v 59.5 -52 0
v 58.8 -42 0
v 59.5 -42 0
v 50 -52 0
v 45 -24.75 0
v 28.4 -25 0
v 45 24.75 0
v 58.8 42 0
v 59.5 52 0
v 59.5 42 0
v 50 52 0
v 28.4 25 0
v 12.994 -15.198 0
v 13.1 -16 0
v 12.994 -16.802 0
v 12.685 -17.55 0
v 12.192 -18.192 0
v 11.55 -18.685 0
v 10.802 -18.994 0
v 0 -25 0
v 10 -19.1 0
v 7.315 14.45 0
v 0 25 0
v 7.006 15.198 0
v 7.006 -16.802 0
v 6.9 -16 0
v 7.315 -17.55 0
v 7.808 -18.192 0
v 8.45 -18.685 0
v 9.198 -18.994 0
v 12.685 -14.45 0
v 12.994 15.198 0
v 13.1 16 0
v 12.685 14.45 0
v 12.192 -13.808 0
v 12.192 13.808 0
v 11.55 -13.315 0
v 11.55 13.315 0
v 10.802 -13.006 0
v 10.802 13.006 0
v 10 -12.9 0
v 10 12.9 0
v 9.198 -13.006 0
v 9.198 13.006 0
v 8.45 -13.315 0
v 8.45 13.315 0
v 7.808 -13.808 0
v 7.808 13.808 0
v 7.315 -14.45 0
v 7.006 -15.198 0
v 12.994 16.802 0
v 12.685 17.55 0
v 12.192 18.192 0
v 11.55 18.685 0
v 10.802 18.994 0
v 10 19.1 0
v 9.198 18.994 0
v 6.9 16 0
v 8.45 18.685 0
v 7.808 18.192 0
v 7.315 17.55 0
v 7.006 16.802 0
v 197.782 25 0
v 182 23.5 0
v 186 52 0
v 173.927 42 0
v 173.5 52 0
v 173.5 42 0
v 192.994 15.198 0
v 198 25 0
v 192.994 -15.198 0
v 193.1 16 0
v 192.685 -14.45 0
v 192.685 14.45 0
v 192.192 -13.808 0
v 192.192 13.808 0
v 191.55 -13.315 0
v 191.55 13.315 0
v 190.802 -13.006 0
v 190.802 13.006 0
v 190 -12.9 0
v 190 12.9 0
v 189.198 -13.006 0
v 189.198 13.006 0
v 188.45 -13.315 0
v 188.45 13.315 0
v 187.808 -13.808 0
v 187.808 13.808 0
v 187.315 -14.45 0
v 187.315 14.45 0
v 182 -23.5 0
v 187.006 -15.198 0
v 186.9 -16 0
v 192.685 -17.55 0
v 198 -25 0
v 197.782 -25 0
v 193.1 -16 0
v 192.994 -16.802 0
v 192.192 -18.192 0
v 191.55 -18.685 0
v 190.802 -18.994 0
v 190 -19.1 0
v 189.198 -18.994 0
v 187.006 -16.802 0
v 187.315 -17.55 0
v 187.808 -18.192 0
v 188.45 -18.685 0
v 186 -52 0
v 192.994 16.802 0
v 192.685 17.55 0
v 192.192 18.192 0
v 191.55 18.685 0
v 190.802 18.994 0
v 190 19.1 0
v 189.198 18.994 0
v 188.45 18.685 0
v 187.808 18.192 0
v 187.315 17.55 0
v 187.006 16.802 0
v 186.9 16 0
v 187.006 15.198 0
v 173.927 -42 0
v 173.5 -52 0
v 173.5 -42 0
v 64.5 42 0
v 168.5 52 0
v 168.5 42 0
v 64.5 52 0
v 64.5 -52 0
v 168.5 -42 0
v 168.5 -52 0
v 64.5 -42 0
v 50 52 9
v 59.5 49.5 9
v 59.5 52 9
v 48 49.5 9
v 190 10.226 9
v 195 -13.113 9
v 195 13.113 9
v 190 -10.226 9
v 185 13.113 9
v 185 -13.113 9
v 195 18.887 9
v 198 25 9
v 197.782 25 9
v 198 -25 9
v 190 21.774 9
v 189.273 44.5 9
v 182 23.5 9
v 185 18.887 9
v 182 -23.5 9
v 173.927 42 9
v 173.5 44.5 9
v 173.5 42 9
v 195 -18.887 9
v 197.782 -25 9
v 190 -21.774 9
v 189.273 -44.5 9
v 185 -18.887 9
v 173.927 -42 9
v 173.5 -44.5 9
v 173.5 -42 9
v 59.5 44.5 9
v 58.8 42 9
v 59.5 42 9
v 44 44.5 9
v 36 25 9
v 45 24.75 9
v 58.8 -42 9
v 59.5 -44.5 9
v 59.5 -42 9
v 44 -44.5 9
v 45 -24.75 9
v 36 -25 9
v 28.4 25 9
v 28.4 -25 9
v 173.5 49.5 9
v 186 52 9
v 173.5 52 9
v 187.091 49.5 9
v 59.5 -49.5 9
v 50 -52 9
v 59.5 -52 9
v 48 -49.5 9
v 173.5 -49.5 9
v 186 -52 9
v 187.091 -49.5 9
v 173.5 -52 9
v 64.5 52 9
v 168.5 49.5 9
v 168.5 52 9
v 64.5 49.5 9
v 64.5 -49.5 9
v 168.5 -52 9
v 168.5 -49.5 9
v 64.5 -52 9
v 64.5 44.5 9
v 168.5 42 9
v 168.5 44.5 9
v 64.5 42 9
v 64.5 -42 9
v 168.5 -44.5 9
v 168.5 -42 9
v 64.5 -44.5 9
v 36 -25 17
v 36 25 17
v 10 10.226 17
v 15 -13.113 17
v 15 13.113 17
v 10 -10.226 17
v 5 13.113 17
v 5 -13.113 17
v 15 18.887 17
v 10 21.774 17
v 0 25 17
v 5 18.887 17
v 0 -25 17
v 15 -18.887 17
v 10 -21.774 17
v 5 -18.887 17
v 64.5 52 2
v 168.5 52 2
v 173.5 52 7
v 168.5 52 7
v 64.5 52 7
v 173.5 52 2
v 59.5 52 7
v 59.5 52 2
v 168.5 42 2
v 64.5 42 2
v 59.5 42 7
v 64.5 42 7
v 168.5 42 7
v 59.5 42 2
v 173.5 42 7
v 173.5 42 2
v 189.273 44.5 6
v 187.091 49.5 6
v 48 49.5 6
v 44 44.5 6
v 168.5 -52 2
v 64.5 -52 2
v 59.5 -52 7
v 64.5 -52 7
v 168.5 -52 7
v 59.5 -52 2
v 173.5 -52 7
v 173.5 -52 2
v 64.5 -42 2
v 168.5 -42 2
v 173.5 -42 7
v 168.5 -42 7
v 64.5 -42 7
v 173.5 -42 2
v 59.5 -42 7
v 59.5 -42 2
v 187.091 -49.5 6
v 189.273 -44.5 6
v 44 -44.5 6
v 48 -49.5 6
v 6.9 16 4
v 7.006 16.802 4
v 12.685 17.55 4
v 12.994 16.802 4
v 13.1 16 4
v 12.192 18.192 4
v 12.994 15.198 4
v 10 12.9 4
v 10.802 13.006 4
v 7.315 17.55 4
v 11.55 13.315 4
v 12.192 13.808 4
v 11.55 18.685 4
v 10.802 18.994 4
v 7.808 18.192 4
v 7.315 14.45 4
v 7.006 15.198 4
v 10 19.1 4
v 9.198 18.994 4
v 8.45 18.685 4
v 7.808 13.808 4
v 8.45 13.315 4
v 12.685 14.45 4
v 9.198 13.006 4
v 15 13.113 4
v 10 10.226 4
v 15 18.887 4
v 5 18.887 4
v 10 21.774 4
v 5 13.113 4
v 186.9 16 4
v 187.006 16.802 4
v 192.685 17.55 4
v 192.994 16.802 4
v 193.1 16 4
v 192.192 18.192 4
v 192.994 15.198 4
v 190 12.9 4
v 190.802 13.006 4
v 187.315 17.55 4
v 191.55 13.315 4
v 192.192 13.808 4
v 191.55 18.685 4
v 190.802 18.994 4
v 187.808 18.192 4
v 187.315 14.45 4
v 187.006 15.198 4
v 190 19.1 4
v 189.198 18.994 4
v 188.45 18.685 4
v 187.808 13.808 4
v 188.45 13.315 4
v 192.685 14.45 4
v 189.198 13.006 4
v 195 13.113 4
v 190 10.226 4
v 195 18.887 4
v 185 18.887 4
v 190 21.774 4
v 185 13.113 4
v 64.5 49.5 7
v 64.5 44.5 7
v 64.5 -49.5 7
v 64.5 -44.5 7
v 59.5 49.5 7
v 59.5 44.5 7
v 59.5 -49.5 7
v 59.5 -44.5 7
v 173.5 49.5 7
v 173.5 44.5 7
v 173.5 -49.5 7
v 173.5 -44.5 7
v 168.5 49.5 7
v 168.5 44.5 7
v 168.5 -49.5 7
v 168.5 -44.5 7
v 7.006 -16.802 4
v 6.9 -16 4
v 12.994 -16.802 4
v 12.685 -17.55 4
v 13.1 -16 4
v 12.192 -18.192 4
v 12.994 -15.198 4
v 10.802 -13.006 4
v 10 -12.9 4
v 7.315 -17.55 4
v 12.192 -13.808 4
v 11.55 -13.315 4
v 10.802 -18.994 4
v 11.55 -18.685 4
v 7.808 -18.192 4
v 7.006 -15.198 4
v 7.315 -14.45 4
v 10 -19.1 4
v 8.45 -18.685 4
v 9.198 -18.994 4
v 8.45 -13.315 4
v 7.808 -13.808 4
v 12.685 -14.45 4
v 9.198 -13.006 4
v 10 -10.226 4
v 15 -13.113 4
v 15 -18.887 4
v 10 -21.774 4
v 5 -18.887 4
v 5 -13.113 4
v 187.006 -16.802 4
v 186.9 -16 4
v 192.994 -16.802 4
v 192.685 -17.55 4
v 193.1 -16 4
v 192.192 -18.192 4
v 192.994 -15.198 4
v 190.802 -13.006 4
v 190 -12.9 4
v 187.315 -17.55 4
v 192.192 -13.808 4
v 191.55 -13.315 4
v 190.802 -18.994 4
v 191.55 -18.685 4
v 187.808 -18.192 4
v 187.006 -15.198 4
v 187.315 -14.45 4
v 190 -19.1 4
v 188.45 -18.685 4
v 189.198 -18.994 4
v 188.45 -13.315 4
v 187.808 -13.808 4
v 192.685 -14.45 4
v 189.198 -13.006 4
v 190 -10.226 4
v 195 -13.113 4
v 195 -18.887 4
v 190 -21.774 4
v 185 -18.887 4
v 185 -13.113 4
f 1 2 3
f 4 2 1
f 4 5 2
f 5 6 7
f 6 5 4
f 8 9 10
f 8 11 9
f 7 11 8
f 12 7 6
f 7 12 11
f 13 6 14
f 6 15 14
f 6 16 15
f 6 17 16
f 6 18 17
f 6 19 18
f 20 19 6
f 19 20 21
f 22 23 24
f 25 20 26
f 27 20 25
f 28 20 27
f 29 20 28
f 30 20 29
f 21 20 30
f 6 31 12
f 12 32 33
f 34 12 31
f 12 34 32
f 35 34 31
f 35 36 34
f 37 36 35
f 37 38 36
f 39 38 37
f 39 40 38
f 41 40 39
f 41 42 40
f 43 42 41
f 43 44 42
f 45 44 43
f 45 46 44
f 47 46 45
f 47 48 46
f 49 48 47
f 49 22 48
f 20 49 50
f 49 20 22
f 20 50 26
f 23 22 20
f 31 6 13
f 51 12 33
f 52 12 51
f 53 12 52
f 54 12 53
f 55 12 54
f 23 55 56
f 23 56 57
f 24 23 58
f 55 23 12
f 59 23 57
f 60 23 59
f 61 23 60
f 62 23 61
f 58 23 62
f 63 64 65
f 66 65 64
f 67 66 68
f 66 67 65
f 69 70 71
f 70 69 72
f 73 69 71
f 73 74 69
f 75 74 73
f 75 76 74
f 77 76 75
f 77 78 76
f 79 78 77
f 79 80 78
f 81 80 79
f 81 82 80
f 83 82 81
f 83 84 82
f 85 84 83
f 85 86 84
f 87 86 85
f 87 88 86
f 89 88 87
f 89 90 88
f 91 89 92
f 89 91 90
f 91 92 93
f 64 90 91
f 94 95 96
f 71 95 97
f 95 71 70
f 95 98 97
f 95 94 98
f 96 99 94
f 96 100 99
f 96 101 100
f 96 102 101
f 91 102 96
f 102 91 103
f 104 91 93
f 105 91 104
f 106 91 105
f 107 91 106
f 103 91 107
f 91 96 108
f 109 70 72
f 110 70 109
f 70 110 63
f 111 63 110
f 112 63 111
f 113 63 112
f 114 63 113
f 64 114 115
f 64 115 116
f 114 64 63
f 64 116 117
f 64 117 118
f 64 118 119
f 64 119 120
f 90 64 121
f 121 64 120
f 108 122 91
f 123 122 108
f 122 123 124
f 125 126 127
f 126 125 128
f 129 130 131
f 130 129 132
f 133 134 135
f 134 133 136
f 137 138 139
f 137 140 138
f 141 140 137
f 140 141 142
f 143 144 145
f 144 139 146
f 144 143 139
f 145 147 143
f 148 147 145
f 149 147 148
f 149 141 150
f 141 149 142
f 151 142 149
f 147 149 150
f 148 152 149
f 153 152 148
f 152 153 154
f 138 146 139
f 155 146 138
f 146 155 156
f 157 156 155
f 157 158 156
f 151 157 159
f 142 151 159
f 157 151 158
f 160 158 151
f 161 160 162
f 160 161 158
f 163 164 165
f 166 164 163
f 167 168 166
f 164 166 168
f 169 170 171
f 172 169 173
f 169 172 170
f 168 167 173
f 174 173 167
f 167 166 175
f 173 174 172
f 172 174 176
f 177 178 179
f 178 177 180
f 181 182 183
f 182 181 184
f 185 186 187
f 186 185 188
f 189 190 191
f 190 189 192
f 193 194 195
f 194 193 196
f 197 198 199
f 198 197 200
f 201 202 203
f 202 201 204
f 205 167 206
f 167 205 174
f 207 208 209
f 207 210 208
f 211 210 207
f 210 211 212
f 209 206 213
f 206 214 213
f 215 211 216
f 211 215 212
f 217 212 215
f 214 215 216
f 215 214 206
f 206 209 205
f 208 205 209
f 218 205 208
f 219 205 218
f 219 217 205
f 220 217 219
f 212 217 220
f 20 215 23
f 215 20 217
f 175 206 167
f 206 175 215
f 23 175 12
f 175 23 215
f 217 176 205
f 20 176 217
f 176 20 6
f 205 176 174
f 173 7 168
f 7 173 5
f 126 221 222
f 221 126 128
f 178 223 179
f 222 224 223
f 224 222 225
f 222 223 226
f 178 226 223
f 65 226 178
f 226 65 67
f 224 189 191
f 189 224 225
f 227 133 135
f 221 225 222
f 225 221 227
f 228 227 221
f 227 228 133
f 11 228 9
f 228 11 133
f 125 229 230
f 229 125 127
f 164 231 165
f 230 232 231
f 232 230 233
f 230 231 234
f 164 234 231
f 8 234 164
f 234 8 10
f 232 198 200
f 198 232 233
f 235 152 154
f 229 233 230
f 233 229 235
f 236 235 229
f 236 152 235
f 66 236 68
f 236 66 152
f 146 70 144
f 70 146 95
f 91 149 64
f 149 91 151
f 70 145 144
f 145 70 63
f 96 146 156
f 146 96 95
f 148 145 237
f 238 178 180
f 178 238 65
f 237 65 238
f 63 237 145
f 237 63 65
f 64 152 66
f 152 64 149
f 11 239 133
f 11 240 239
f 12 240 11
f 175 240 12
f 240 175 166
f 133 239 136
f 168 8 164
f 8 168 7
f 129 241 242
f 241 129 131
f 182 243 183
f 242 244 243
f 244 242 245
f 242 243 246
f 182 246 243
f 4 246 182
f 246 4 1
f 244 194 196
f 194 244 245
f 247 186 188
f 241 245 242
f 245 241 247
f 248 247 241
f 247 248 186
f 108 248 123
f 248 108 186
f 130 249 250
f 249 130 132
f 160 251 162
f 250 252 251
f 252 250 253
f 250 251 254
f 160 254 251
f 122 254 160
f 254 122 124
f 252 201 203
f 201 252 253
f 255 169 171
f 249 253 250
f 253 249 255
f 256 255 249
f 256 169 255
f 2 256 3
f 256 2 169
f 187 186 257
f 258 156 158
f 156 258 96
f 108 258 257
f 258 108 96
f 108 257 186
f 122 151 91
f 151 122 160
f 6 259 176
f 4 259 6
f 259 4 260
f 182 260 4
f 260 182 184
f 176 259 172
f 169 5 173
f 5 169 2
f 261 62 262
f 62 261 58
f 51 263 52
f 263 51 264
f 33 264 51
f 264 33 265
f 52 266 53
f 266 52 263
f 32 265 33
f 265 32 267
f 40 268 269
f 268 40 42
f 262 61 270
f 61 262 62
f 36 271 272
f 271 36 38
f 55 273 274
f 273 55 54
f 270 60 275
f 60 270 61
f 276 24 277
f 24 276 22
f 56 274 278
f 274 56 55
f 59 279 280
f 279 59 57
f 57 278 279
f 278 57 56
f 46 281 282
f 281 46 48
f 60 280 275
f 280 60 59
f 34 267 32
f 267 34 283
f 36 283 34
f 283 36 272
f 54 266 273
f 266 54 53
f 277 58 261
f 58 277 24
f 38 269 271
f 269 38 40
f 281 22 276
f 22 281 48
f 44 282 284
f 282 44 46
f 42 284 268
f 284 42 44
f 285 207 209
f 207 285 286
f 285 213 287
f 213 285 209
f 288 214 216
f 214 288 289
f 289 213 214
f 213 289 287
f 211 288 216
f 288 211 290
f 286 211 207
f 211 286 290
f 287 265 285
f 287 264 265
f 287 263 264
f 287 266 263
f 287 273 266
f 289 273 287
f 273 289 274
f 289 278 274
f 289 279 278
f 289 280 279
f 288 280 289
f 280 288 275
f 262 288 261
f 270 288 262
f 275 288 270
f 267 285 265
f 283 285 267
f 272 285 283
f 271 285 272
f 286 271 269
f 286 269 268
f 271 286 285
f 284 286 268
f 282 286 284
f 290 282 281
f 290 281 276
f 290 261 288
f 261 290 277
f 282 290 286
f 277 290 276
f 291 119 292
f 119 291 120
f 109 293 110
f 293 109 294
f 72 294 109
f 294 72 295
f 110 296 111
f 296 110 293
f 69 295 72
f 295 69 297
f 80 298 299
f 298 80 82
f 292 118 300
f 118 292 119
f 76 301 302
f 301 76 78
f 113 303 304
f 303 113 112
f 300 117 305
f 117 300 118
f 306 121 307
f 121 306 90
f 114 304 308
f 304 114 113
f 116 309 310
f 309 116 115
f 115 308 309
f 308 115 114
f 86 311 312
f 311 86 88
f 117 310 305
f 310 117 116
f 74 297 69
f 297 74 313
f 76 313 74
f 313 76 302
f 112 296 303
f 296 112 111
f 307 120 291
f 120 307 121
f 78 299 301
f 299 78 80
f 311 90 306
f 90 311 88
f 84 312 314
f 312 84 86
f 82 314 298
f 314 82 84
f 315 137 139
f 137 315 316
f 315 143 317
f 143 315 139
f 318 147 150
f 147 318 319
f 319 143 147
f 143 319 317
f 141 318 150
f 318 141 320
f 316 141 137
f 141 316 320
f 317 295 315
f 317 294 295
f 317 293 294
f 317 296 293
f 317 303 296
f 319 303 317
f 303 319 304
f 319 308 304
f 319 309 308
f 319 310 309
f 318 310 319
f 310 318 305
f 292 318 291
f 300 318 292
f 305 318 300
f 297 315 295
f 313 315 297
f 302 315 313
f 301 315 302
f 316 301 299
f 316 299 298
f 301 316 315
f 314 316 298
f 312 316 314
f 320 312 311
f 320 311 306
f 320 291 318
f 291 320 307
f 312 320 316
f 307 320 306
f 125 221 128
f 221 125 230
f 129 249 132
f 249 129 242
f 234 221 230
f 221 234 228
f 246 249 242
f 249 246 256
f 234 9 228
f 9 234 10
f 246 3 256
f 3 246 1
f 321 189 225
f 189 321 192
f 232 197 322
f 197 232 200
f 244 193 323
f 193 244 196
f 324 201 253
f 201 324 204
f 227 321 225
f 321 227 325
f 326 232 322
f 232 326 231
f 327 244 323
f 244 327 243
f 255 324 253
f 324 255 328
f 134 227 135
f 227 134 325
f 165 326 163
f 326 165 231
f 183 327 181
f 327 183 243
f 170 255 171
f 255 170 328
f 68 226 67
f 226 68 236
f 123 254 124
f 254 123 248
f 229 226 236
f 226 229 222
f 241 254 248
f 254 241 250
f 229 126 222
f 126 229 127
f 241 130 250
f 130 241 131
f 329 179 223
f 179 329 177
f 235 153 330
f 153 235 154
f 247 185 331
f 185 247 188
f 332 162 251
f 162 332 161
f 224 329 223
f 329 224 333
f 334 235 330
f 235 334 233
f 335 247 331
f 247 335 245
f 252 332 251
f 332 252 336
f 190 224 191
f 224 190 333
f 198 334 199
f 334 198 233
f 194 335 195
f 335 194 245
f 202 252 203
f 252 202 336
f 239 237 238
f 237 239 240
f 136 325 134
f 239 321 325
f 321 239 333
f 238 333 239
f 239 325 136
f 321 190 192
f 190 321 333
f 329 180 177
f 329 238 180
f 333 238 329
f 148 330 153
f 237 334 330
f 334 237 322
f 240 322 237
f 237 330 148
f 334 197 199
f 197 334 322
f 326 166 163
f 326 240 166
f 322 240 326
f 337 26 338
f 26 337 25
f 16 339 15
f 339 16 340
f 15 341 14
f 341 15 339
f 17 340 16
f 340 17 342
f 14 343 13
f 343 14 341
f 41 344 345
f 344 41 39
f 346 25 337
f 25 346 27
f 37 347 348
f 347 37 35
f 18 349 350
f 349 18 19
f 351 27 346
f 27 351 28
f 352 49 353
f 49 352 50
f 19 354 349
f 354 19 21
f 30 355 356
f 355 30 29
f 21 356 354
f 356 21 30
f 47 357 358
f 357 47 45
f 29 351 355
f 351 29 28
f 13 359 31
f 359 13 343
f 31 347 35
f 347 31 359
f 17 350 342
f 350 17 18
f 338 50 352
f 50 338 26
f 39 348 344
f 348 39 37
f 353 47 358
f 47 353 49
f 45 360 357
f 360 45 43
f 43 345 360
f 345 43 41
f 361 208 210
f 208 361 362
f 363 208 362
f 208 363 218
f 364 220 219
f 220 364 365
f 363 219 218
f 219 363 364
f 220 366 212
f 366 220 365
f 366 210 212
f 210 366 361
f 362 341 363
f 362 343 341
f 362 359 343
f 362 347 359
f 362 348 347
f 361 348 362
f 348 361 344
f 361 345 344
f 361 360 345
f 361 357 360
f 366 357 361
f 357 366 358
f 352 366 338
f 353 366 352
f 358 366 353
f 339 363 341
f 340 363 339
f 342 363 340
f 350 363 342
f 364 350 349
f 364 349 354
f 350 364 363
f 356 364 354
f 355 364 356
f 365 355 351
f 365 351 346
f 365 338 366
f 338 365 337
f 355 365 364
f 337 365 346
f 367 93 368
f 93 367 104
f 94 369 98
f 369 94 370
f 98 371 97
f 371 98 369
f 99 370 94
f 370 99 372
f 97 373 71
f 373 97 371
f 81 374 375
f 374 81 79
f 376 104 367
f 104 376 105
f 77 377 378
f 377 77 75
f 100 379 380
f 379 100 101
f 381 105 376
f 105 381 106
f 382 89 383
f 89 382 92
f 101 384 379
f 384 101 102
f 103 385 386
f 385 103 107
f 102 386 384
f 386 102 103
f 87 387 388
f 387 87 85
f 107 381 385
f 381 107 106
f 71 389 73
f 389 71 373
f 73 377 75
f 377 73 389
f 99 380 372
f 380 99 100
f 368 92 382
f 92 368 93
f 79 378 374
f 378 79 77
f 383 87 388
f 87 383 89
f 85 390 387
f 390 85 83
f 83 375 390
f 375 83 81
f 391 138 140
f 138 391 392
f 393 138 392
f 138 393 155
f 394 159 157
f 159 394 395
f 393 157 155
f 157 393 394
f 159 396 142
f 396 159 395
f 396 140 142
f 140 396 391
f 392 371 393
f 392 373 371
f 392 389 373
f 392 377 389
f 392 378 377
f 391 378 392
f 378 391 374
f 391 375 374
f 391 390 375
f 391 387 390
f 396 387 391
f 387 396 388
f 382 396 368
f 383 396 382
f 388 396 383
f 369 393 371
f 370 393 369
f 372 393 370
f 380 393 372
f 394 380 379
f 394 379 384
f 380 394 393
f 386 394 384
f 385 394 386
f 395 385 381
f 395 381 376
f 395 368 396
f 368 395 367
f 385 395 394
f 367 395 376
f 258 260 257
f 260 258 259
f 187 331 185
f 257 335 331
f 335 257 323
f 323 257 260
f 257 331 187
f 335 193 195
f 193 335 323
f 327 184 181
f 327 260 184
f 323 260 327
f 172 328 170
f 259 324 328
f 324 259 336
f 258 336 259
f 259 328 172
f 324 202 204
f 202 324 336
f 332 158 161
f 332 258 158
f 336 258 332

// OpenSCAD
FFF=[false,false,false];FFT=[false,false,true];
FTF=[false,true,false];FTT=[false,true,true];
TFF=[true,false,false];TFT=[true,false,true];
TTF=[true,true,false];TTT=[true,true,true];
module cube2(size, center) {
  translate([
    center[0] ? -size[0]/2 : 0,
    center[1] ? -size[1]/2 : 0,
    center[2] ? -size[2]/2 : 0]) cube(size);
}
module mirror_x() {
  for(a=[0,1])mirror([a,0,0])children();
}
module mirror_y() {
  for(a=[0,1])mirror([0,a,0])children();
}
module mirror_z() {
  for(a=[0,1])mirror([0,0,a])children();
}


holes_x=180;
holes_y=32;
holed_d=6.2;
difference() {
    union() mirror_y() {
        for(a=[0,1])translate([holes_x*a+10,holes_y/2]) cylinder(d=16,h=9);
        cube2([36,50,17],FTF);
        cube2([45,50,9],FTF);
        translate([50,94/2])cube2([130,10,9],FTF);
        translate([holes_x+10,0])cube2([16,50,9],TTF);
        hull() {
            translate([170,94/2+4])cube2([16,1,9],FFF);
            translate([holes_x+10,24])cube2([16,1,9],TTF);
        }
        hull() {
            translate([50,94/2+4])cube2([16,1,9],FFF);
            translate([36,24])cube2([16,1,9],TTF);
        }
    }
    mirror_y() {
        for(a=[0,1])translate([holes_x*a+10,holes_y/2]) {
           cylinder(d=6.2,h=30,center=true,$fn=24);
           translate([0,0,4])rotate([0,0,30])cylinder(d=10*2/sqrt(3),h=30,$fn=6);
        }
        translate([0,94/2,6])cube2([500,5,10],TTF);
        for(a=[62,171])translate([a,0]) {
            cube2([5,200,4],TTT);
            translate([0,0,7])cube2([5,200,4],TTF);
        }
    }
}
